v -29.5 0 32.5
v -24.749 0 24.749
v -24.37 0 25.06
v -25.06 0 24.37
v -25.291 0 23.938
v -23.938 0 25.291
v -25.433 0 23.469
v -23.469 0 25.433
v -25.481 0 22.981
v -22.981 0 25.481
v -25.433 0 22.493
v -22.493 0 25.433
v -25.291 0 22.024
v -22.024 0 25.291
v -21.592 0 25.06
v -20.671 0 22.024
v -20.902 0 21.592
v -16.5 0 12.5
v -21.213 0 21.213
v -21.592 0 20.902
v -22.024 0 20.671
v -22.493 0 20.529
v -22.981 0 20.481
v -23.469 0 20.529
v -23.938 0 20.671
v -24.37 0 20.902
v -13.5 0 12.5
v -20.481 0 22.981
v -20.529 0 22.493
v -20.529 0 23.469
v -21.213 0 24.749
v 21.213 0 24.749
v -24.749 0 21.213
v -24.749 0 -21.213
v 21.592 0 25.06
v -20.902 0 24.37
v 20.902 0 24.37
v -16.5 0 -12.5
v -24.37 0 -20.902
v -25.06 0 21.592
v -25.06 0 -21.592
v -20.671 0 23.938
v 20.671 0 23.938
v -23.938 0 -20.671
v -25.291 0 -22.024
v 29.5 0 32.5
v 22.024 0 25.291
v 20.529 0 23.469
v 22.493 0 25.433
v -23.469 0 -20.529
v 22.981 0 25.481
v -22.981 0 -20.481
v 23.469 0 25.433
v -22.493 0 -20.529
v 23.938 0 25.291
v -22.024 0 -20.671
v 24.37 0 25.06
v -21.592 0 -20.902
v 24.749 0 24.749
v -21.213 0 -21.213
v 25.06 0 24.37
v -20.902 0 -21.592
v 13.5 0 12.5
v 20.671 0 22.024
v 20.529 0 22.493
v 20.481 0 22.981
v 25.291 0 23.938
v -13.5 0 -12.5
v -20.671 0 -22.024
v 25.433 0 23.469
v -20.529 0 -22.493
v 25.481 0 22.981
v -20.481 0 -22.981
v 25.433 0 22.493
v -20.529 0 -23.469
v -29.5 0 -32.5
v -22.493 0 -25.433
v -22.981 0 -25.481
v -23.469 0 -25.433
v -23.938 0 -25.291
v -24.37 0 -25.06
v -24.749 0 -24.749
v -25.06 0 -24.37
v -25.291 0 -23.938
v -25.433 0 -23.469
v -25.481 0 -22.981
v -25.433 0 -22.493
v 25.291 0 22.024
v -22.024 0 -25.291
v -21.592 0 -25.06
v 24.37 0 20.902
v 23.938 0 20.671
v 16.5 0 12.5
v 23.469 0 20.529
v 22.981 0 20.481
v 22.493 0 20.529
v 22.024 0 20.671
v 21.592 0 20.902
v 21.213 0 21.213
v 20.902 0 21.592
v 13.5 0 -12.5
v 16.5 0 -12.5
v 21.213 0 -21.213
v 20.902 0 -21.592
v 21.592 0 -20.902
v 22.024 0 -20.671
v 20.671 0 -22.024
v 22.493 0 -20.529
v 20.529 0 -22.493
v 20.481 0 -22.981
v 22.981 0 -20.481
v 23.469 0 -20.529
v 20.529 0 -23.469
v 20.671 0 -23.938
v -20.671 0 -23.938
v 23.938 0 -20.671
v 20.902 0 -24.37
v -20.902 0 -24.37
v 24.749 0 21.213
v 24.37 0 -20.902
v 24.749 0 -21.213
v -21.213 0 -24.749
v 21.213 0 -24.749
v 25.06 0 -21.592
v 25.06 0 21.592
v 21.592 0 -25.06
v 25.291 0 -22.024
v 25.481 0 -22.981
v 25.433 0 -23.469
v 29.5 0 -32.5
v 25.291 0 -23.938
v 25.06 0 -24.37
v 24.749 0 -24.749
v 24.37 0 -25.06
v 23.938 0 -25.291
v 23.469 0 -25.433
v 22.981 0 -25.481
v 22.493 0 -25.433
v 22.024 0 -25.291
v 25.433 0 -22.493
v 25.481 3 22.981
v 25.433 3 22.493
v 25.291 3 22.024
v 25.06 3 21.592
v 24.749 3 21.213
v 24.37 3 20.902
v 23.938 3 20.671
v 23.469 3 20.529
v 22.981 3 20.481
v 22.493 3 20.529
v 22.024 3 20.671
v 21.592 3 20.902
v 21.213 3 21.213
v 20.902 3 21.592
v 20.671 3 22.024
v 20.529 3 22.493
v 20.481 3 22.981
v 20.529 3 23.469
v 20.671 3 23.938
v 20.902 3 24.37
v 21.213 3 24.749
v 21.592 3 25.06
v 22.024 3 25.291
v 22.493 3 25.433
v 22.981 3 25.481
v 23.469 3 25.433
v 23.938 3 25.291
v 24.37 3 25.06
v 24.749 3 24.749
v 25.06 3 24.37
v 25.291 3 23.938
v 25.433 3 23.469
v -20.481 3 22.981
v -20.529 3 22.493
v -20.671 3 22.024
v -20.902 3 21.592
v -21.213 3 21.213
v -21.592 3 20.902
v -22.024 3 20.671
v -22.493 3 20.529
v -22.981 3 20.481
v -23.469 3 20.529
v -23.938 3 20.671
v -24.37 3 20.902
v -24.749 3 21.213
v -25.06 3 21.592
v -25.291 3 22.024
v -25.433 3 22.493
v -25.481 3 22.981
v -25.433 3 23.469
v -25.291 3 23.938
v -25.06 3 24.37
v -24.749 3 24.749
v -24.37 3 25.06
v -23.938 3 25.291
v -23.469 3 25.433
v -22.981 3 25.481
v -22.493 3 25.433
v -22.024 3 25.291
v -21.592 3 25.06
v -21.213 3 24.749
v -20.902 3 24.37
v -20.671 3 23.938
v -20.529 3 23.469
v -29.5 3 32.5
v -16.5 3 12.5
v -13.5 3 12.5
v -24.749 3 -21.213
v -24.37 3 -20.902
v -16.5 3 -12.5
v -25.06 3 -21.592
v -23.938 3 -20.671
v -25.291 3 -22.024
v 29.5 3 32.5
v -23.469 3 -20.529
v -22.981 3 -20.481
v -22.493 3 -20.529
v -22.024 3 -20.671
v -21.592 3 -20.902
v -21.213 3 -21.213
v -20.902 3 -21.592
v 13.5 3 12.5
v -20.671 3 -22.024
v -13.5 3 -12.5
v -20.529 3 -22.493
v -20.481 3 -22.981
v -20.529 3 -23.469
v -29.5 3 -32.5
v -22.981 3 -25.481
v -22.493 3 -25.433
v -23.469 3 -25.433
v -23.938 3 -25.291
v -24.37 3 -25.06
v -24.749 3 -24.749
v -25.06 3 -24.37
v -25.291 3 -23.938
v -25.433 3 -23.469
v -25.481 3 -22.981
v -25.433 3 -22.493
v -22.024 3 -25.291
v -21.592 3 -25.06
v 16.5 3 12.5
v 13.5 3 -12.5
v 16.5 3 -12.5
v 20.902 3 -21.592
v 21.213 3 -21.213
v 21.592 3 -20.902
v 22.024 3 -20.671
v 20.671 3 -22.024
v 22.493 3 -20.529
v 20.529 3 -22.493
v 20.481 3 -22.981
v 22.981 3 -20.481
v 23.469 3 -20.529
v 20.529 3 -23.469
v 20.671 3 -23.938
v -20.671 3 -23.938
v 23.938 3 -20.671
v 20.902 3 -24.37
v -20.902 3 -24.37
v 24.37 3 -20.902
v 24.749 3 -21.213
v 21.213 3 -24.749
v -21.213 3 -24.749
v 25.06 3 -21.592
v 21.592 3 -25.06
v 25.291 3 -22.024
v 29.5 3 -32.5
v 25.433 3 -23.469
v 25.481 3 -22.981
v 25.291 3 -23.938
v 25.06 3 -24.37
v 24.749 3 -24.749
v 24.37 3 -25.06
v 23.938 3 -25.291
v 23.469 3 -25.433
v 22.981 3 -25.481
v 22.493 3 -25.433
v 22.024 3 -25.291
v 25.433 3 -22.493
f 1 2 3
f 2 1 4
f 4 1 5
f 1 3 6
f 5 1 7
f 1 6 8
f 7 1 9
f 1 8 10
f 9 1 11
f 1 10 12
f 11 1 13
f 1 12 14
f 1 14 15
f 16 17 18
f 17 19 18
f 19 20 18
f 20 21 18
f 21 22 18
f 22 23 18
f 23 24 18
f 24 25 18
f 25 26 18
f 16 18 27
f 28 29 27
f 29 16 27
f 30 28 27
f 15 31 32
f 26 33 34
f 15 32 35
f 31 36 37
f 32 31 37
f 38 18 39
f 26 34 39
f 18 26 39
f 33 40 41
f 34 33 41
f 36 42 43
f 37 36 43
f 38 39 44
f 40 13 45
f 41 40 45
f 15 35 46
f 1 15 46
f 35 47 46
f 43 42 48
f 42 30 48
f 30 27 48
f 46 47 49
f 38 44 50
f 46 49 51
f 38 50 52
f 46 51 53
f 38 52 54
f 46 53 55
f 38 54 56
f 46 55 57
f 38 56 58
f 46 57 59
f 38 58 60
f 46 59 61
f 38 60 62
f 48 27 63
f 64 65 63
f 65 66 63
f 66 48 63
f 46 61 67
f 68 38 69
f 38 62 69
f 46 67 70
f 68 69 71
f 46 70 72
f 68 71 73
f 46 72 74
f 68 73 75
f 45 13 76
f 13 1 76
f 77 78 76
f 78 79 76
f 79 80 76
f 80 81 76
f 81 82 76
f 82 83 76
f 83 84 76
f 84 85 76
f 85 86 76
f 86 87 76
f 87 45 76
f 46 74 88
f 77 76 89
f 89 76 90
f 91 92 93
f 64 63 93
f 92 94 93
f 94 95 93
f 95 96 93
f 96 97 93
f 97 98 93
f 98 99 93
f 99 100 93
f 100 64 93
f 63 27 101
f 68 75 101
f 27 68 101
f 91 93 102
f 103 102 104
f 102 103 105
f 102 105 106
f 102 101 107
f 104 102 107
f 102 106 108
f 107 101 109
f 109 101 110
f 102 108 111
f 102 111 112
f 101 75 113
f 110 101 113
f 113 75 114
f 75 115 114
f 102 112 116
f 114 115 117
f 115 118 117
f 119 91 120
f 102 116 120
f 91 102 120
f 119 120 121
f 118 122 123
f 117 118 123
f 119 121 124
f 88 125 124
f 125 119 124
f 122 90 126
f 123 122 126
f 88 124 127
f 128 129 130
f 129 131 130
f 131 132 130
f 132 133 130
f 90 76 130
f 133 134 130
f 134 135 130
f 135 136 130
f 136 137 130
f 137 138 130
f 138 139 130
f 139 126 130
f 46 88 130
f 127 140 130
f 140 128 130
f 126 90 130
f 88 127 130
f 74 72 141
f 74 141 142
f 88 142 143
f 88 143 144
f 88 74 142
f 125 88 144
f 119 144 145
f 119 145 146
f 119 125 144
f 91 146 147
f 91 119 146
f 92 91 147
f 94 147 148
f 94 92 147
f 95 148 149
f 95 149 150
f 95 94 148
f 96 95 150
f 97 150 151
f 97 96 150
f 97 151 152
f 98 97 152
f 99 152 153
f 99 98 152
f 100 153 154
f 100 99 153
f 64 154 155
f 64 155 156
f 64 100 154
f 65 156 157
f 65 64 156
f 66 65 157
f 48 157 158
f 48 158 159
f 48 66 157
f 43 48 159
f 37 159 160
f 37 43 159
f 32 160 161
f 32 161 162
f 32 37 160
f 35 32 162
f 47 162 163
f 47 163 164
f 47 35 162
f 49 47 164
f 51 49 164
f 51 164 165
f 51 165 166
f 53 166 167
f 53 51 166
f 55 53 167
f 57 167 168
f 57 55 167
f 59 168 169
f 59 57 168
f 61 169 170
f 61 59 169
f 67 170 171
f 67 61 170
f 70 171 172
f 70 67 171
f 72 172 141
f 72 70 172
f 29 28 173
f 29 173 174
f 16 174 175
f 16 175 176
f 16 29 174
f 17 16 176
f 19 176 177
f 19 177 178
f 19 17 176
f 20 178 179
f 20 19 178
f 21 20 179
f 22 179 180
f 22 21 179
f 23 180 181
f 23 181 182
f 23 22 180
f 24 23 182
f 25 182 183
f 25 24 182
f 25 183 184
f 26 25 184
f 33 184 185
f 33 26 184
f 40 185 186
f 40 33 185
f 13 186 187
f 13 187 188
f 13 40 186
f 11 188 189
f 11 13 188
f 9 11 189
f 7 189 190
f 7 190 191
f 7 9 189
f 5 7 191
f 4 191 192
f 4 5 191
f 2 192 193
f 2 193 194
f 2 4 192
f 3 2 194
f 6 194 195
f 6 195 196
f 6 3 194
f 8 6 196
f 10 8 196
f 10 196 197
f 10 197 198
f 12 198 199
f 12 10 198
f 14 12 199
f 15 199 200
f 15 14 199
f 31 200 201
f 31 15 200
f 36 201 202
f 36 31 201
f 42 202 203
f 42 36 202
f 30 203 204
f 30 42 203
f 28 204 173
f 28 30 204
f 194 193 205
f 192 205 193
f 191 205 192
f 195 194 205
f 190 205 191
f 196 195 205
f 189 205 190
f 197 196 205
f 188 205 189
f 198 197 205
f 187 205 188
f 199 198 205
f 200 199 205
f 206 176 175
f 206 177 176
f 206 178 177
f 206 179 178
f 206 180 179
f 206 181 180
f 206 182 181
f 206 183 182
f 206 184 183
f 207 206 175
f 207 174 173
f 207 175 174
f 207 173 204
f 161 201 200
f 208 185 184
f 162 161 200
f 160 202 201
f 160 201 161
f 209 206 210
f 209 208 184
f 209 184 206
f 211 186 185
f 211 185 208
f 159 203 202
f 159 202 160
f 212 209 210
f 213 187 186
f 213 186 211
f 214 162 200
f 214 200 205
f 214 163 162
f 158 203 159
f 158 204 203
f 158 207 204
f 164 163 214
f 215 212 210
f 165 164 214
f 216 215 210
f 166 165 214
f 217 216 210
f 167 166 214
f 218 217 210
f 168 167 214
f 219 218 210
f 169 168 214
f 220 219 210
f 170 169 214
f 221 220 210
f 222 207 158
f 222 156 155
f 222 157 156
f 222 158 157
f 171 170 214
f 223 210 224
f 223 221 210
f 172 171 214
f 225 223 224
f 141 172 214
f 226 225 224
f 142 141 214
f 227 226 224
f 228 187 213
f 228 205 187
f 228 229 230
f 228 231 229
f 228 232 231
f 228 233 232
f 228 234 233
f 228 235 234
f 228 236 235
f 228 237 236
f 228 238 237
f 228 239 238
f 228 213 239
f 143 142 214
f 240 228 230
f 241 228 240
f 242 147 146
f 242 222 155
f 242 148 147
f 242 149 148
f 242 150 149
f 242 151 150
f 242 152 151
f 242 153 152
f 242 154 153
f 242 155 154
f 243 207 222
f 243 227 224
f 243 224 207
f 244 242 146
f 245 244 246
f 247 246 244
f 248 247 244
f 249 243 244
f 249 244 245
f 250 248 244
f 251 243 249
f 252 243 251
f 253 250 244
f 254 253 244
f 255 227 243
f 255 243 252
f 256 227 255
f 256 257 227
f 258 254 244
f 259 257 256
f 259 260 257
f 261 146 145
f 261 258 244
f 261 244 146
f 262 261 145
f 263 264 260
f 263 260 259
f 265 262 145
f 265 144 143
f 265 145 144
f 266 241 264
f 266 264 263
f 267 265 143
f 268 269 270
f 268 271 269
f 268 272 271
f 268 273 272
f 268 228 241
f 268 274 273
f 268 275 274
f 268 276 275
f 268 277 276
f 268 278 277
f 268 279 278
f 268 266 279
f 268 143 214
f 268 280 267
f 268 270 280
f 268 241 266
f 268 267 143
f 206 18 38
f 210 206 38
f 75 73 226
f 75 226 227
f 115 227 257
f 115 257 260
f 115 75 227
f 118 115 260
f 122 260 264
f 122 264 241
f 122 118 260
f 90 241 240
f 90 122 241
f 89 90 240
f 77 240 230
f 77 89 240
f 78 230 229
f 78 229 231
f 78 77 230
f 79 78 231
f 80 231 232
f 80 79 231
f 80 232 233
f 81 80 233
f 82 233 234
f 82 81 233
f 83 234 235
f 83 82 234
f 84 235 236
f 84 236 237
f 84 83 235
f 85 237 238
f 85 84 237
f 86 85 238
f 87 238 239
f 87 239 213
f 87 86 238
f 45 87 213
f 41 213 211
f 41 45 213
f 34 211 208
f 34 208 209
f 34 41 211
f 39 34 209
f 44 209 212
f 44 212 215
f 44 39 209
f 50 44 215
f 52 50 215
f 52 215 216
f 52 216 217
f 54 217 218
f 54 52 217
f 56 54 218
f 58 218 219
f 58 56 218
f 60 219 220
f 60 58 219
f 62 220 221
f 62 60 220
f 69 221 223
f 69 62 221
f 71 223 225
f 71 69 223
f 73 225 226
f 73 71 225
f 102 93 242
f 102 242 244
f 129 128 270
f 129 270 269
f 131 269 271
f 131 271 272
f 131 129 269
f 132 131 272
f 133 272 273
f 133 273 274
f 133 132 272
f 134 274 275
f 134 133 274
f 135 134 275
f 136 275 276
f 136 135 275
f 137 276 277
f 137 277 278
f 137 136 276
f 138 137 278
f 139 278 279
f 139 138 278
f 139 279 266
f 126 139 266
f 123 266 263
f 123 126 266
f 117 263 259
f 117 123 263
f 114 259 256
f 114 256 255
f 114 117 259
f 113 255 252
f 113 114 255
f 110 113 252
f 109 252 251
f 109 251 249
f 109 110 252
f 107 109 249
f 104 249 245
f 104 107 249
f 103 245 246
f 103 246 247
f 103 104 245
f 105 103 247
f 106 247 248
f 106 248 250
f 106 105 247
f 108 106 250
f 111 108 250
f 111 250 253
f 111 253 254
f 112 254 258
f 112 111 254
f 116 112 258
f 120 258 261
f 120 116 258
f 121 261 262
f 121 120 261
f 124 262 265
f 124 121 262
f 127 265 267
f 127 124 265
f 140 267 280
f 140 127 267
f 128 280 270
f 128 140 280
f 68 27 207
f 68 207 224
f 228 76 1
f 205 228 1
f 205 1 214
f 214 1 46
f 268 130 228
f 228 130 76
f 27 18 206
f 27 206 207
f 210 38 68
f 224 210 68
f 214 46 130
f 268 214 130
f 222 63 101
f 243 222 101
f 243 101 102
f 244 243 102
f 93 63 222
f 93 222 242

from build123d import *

# Parameters (mm, degrees)
SKETCH1_R           = 2.5
SKETCH1_W           = 3
SKETCH1_H           = 25
BOSS_EXTRUDE1_DEPTH = 3


with BuildPart() as part:
    # Sketch1 → Boss-Extrude1 (new body)
    with BuildSketch(Plane(origin=(0, 0, 0), x_dir=(1, 0, 0), z_dir=(0, 1, 0))):
        Polygon((-29.5, 32.5), (-29.5, 12.5), (-29.5, -12.5), (-29.5, -32.5), (29.5, -32.5), (29.5, -12.5), (29.5, 12.5), (29.5, 32.5), align=None)
        with Locations((-22.980970389, -22.980970389)):
            Circle(SKETCH1_R, mode=Mode.SUBTRACT)
        with Locations((22.980970389, -22.980970389)):
            Circle(SKETCH1_R, mode=Mode.SUBTRACT)
        with Locations((-15, 0)):
            Rectangle(SKETCH1_W, SKETCH1_H, mode=Mode.SUBTRACT)
        with Locations((-22.980970389, 22.980970389)):
            Circle(SKETCH1_R, mode=Mode.SUBTRACT)
        with Locations((15, 0)):
            Rectangle(SKETCH1_W, SKETCH1_H, mode=Mode.SUBTRACT)
        with Locations((22.980970389, 22.980970389)):
            Circle(SKETCH1_R, mode=Mode.SUBTRACT)
    extrude(amount=BOSS_EXTRUDE1_DEPTH)


solid = part.part
